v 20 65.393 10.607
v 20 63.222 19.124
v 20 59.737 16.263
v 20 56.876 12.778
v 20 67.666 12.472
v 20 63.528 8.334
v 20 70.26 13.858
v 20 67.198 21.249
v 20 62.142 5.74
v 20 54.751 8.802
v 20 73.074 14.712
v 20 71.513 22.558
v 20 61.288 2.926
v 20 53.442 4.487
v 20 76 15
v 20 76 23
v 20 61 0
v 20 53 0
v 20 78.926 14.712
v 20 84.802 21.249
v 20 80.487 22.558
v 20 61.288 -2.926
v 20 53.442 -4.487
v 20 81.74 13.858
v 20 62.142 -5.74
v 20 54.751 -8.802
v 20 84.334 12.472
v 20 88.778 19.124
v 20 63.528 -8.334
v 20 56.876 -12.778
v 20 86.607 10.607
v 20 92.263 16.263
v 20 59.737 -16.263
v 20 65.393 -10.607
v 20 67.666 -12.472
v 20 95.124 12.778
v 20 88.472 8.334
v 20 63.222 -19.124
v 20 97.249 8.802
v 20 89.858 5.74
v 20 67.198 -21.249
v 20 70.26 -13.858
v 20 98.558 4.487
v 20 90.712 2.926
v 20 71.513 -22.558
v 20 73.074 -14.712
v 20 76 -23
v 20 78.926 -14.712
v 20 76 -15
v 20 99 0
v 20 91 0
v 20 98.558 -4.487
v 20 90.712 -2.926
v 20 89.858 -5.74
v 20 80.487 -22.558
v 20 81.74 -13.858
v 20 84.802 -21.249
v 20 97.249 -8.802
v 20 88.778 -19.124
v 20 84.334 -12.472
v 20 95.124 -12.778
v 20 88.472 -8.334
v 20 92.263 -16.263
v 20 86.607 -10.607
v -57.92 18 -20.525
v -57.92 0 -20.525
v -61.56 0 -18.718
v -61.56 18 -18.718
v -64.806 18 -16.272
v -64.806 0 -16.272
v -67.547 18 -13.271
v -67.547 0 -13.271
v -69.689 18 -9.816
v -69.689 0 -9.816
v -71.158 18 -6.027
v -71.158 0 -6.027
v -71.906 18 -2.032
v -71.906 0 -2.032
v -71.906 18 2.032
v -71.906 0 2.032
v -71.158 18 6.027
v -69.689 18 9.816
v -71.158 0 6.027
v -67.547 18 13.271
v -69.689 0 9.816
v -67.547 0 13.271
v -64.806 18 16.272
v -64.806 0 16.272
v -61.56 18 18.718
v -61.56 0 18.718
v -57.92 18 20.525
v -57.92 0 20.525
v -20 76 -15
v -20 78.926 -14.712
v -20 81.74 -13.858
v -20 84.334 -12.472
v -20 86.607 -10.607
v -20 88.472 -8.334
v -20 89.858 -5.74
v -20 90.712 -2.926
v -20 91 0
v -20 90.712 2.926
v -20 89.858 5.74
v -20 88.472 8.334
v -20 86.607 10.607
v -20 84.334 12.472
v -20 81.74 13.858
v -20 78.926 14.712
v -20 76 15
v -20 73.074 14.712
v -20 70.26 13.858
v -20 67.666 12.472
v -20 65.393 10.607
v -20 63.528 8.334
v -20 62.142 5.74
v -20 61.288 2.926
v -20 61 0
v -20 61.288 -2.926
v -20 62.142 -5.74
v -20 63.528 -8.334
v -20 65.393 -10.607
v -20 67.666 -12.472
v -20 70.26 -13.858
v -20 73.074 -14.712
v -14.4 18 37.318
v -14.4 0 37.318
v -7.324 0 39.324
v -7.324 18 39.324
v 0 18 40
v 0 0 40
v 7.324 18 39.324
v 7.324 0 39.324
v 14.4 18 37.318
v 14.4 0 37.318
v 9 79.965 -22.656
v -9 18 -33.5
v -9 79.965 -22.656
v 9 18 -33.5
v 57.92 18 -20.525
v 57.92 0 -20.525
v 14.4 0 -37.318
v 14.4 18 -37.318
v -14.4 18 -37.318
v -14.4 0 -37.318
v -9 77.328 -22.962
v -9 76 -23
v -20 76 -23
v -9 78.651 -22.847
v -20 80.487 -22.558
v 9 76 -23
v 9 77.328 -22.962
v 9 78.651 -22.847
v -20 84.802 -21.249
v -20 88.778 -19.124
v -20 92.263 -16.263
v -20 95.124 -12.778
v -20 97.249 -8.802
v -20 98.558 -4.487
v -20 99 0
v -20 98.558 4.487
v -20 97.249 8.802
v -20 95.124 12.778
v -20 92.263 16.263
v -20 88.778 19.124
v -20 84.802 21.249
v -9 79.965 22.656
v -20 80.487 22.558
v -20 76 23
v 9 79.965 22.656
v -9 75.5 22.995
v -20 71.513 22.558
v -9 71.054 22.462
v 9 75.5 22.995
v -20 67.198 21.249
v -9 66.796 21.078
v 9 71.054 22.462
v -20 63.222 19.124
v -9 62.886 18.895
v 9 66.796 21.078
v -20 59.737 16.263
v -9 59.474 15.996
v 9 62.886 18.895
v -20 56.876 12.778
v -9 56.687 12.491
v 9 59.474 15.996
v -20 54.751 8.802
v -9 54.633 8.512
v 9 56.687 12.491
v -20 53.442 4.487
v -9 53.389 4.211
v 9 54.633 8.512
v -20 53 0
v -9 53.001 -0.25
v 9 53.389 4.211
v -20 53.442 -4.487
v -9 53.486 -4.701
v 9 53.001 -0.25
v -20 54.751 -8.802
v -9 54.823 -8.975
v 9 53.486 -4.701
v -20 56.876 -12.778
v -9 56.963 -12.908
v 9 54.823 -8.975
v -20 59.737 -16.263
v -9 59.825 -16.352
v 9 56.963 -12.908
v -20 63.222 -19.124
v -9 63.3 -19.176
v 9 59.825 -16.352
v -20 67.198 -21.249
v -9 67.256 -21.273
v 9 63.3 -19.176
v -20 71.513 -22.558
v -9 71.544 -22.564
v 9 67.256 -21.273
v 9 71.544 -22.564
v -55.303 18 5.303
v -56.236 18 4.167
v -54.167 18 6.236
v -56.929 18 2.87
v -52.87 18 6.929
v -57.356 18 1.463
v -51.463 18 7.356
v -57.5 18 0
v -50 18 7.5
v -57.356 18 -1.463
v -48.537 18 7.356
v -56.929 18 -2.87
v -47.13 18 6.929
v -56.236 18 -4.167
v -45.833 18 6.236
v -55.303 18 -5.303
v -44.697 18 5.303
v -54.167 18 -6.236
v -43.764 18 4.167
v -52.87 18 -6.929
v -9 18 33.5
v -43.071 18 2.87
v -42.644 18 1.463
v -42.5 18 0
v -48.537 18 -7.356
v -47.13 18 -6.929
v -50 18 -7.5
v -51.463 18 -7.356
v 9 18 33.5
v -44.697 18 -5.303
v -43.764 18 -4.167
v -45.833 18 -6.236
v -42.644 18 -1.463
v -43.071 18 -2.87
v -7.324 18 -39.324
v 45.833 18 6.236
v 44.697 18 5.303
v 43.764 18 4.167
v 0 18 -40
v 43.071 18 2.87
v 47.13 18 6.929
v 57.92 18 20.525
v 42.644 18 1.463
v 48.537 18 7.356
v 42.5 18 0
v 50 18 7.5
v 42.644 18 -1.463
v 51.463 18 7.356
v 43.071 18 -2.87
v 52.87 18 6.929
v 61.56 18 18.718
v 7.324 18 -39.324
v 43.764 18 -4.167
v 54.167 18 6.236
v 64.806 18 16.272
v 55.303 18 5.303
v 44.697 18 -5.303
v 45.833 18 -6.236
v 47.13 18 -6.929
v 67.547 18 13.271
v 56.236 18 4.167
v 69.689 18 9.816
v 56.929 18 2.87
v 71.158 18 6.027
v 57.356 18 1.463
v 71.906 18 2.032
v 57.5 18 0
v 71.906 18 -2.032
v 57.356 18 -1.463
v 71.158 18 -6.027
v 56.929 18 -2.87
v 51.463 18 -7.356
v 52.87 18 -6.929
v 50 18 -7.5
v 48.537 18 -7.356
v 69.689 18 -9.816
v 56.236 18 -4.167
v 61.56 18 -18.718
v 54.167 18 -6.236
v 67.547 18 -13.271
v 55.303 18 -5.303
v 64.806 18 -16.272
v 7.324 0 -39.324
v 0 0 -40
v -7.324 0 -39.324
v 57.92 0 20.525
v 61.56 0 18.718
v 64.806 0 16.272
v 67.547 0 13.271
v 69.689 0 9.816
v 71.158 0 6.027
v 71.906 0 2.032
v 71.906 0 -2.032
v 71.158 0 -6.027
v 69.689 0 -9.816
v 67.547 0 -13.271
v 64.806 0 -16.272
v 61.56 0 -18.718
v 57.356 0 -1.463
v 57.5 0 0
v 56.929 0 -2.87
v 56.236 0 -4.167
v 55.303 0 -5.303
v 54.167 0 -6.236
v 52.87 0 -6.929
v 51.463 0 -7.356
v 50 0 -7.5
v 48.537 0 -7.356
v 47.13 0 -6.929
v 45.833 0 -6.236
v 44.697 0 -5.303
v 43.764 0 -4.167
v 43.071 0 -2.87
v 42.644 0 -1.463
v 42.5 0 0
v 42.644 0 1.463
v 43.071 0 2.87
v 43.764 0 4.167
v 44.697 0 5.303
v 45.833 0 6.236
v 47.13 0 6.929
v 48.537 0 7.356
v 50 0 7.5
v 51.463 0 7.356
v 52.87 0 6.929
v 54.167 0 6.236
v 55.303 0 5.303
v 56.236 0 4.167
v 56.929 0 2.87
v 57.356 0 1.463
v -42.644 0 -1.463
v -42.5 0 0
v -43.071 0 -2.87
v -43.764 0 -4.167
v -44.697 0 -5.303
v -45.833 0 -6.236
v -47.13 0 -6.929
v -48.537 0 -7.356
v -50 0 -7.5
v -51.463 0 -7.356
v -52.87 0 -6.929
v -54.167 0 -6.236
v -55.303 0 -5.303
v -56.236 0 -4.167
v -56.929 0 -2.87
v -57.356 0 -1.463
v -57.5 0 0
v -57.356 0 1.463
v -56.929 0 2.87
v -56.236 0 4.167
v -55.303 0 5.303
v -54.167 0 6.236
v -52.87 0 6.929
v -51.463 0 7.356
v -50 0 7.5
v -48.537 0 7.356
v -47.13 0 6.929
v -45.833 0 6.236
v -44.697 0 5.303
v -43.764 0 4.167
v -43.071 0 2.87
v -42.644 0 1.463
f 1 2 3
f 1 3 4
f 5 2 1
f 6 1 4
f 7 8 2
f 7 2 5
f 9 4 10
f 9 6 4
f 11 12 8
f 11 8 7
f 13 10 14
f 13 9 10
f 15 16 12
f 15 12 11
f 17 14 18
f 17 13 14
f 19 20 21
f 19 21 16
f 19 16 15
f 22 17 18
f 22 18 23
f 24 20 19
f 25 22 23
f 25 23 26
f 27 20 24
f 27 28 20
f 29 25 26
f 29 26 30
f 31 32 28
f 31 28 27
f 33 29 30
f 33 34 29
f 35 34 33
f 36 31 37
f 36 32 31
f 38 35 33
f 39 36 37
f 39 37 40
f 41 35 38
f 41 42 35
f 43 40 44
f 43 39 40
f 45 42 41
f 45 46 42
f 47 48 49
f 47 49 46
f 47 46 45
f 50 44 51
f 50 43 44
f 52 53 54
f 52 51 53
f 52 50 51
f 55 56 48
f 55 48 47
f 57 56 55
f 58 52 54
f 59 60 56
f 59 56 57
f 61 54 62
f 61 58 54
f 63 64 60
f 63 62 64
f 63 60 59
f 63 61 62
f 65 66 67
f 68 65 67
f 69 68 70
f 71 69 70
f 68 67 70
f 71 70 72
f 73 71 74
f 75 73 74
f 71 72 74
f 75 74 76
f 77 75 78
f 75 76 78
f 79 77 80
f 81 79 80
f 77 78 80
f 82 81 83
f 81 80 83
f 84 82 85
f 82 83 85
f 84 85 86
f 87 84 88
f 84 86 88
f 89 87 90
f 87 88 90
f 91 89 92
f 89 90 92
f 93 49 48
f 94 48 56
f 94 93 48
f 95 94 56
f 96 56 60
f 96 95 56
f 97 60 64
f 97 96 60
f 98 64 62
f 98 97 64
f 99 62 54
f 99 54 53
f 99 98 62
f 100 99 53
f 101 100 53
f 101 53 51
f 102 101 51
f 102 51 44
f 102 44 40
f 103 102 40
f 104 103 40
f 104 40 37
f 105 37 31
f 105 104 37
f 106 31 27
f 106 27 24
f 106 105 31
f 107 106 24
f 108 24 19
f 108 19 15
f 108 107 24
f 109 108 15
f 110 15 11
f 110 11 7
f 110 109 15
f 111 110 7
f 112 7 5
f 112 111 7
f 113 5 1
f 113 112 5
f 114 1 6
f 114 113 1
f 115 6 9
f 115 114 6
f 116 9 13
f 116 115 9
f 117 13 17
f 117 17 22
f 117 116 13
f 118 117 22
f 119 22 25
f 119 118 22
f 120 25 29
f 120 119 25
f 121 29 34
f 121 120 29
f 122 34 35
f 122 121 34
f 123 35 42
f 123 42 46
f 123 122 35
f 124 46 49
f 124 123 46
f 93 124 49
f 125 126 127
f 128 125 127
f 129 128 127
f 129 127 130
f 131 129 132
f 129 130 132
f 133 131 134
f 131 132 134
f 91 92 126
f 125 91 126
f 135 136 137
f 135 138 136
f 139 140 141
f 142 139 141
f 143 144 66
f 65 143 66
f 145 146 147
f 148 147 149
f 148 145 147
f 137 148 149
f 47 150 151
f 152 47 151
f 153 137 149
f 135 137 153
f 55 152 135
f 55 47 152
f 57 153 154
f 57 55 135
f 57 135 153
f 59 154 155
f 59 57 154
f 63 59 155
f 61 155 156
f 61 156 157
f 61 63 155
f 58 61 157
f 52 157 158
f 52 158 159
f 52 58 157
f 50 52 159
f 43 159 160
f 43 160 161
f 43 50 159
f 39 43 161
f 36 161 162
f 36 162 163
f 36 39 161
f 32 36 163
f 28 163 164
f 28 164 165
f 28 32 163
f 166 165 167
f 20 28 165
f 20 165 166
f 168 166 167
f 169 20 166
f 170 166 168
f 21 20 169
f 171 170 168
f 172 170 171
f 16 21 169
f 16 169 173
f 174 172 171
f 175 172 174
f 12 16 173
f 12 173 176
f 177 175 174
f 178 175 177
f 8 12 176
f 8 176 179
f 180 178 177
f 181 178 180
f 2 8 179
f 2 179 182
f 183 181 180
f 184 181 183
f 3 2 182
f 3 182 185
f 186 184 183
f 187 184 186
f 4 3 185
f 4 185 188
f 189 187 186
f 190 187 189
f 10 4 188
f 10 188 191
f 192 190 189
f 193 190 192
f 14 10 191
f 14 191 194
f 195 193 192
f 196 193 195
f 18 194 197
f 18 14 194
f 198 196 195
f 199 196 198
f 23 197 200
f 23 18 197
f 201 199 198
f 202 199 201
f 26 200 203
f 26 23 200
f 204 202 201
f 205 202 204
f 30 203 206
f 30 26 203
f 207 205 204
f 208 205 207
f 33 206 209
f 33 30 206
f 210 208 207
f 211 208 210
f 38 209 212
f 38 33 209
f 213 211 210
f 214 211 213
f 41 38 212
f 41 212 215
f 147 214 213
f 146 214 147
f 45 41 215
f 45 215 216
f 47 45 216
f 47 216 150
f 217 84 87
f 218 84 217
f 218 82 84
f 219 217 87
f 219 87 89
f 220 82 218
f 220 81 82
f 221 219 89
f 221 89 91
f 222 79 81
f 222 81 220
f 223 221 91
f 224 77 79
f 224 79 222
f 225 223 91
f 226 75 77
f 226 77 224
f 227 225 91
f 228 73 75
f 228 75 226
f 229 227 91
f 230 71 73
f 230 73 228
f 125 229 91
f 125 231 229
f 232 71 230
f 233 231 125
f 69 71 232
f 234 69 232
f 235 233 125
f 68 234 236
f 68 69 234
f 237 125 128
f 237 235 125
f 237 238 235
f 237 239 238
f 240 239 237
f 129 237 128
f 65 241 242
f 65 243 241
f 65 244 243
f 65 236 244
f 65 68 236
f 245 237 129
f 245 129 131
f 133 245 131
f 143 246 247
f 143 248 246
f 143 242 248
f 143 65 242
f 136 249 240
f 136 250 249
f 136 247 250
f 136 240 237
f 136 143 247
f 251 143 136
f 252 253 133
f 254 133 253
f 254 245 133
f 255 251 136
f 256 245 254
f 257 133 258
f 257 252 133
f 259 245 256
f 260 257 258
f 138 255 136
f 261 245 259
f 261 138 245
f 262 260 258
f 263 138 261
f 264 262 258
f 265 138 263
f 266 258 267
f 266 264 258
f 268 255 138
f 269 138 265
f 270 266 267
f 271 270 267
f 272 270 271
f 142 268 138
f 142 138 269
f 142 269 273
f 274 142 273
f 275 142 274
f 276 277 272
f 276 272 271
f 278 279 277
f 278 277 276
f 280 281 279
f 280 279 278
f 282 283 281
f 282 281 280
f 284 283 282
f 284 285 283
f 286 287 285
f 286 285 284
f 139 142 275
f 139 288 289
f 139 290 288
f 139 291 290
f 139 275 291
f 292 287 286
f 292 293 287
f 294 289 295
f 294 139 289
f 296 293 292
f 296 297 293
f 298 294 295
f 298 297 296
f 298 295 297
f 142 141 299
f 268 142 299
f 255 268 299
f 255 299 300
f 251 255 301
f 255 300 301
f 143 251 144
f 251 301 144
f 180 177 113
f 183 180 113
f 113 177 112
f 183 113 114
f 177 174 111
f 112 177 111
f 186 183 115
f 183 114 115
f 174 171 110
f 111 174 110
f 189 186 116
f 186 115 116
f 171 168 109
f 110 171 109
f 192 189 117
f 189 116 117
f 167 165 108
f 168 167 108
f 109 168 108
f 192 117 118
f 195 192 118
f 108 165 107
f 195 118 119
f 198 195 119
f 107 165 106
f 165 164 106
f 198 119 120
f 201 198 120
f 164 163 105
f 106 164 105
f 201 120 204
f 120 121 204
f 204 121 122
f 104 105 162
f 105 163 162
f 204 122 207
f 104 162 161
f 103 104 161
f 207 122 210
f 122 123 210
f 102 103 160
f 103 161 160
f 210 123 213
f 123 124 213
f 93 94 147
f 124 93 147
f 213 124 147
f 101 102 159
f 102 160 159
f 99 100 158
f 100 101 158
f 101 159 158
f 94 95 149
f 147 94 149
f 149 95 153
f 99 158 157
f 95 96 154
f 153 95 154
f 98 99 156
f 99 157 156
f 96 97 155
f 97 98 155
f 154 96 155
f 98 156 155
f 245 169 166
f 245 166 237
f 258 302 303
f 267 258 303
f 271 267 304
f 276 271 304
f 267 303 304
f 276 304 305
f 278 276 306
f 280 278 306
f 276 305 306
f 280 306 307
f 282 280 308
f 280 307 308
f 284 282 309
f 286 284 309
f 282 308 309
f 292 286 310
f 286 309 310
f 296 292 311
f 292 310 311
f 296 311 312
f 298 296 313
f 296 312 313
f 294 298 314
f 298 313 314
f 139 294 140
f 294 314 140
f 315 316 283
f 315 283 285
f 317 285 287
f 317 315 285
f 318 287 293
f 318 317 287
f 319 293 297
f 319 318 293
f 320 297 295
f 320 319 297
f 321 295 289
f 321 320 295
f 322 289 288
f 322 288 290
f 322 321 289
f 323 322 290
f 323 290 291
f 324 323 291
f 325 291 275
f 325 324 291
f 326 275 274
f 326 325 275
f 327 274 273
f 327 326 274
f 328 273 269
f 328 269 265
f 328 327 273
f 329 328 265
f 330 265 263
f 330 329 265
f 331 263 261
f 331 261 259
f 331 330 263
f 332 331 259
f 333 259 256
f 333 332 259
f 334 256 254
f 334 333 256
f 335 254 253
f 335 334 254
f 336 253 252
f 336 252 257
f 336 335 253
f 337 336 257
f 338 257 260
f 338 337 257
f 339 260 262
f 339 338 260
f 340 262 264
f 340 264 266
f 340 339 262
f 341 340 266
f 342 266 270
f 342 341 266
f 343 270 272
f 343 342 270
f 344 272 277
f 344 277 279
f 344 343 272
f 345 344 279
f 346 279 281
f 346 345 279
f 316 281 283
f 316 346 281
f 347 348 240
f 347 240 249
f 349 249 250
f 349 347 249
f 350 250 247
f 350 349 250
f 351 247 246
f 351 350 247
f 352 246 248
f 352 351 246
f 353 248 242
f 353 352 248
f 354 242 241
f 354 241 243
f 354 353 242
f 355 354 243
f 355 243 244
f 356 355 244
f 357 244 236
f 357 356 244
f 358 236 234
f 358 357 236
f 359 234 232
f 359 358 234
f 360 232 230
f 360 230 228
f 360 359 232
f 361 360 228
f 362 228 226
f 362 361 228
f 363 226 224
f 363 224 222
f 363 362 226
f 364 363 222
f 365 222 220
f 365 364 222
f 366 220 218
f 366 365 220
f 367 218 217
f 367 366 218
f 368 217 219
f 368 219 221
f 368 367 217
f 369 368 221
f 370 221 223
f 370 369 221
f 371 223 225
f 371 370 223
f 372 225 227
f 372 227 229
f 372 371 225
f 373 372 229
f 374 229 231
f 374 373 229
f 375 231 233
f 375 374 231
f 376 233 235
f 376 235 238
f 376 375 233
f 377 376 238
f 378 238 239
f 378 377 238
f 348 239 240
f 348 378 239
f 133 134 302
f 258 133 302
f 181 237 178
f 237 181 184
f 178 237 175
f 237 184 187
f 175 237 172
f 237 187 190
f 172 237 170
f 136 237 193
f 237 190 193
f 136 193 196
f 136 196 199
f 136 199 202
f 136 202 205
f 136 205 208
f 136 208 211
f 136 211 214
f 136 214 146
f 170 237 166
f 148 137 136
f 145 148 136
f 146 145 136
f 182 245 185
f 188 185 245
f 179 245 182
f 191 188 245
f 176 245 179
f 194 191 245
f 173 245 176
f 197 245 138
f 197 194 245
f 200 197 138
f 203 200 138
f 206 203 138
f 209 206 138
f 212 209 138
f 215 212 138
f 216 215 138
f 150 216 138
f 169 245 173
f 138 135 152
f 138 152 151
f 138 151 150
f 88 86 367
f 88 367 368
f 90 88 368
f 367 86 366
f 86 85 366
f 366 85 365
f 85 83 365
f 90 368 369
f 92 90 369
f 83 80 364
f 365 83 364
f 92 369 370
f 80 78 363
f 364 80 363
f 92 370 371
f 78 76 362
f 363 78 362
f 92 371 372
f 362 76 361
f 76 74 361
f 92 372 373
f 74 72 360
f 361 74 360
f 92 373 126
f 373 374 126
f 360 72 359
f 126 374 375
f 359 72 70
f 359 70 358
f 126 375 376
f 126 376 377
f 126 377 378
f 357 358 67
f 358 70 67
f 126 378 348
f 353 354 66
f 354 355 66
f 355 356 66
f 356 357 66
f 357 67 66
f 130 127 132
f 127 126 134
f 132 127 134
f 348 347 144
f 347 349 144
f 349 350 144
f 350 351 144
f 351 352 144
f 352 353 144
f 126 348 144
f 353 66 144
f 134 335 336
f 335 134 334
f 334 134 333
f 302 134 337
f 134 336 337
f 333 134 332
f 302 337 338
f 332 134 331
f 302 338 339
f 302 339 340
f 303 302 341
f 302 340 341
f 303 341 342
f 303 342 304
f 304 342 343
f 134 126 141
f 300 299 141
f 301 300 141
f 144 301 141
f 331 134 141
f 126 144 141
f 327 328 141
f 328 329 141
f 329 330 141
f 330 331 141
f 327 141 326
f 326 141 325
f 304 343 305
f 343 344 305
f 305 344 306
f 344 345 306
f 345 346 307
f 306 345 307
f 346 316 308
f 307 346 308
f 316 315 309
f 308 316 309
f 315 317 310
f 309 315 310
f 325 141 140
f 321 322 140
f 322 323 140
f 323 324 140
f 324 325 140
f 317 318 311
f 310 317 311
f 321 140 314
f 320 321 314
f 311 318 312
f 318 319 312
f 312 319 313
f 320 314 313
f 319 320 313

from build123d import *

# Parameters (mm, degrees)
SKETCH_1_R      = 7.5
EXTRUDE_1_DEPTH = 18
SKETCH_2_R      = 15
EXTRUDE_2_DEPTH = 20
EXTRUDE_3_DEPTH = 9


with BuildPart() as part:
    # 草圖1 → 填料-伸長1 (new body)
    with BuildSketch(Plane(origin=(0, 0, 0), x_dir=(1, 0, 0), z_dir=(0, 1, 0))):
        with BuildLine():
            Line((-57.92, -20.52495067), (-14.4, -37.318092127))
            ThreePointArc((-14.4, -37.318092127), (0, -40), (14.4, -37.318092127))
            Line((14.4, -37.318092127), (57.92, -20.52495067))
            ThreePointArc((57.92, -20.52495067), (72, 0), (57.92, 20.52495067))
            Line((57.92, 20.52495067), (14.4, 37.318092127))
            ThreePointArc((14.4, 37.318092127), (0, 40), (-14.4, 37.318092127))
            Line((-14.4, 37.318092127), (-57.92, 20.52495067))
            ThreePointArc((-57.92, 20.52495067), (-72, 0), (-57.92, -20.52495067))
        make_face()
        with Locations((50, 0)):
            Circle(SKETCH_1_R, mode=Mode.SUBTRACT)
        with Locations((-50, 0)):
            Circle(SKETCH_1_R, mode=Mode.SUBTRACT)
    extrude(amount=EXTRUDE_1_DEPTH)



with BuildPart() as body_2:
    # 草圖2 → 填料-伸長2 (new, symmetric)
    with BuildSketch(Plane(origin=(0, 0, 0), x_dir=(0, 0, -1), z_dir=(1, 0, 0))):
        with BuildLine():
            ThreePointArc((22.655671663, 79.964913806), (0, 99), (-22.655671663, 79.964913806))
            ThreePointArc((-22.655671663, 79.964913806), (-1.989918559, 53.08624378), (23, 76))
            ThreePointArc((23, 76), (22.91375622, 77.989918559), (22.655671663, 79.964913806))
        make_face()
        with Locations((0, 76)):
            Circle(SKETCH_2_R, mode=Mode.SUBTRACT)
    extrude(amount=EXTRUDE_2_DEPTH, both=True)


with BuildPart() as part_1:
    add(part.part)

    add(body_2.part)  # 填料-伸長3 merges body 2
    # 草圖2<3> → 填料-伸長3 (add, symmetric)
    with BuildSketch(Plane(origin=(0, 0, 0), x_dir=(0, 0, -1), z_dir=(1, 0, 0))):
        with BuildLine():
            ThreePointArc((23, 76), (-1.989918559, 53.08624378), (-22.655671663, 79.964913806))
            Line((-22.655671663, 79.964913806), (-33.5, 18))
            Line((-33.5, 18), (33.5, 18))
            Line((33.5, 18), (22.655671663, 79.964913806))
            ThreePointArc((22.655671663, 79.964913806), (22.91375622, 77.989918559), (23, 76))
        make_face()
    extrude(amount=EXTRUDE_3_DEPTH, both=True)


solid = part_1.part
